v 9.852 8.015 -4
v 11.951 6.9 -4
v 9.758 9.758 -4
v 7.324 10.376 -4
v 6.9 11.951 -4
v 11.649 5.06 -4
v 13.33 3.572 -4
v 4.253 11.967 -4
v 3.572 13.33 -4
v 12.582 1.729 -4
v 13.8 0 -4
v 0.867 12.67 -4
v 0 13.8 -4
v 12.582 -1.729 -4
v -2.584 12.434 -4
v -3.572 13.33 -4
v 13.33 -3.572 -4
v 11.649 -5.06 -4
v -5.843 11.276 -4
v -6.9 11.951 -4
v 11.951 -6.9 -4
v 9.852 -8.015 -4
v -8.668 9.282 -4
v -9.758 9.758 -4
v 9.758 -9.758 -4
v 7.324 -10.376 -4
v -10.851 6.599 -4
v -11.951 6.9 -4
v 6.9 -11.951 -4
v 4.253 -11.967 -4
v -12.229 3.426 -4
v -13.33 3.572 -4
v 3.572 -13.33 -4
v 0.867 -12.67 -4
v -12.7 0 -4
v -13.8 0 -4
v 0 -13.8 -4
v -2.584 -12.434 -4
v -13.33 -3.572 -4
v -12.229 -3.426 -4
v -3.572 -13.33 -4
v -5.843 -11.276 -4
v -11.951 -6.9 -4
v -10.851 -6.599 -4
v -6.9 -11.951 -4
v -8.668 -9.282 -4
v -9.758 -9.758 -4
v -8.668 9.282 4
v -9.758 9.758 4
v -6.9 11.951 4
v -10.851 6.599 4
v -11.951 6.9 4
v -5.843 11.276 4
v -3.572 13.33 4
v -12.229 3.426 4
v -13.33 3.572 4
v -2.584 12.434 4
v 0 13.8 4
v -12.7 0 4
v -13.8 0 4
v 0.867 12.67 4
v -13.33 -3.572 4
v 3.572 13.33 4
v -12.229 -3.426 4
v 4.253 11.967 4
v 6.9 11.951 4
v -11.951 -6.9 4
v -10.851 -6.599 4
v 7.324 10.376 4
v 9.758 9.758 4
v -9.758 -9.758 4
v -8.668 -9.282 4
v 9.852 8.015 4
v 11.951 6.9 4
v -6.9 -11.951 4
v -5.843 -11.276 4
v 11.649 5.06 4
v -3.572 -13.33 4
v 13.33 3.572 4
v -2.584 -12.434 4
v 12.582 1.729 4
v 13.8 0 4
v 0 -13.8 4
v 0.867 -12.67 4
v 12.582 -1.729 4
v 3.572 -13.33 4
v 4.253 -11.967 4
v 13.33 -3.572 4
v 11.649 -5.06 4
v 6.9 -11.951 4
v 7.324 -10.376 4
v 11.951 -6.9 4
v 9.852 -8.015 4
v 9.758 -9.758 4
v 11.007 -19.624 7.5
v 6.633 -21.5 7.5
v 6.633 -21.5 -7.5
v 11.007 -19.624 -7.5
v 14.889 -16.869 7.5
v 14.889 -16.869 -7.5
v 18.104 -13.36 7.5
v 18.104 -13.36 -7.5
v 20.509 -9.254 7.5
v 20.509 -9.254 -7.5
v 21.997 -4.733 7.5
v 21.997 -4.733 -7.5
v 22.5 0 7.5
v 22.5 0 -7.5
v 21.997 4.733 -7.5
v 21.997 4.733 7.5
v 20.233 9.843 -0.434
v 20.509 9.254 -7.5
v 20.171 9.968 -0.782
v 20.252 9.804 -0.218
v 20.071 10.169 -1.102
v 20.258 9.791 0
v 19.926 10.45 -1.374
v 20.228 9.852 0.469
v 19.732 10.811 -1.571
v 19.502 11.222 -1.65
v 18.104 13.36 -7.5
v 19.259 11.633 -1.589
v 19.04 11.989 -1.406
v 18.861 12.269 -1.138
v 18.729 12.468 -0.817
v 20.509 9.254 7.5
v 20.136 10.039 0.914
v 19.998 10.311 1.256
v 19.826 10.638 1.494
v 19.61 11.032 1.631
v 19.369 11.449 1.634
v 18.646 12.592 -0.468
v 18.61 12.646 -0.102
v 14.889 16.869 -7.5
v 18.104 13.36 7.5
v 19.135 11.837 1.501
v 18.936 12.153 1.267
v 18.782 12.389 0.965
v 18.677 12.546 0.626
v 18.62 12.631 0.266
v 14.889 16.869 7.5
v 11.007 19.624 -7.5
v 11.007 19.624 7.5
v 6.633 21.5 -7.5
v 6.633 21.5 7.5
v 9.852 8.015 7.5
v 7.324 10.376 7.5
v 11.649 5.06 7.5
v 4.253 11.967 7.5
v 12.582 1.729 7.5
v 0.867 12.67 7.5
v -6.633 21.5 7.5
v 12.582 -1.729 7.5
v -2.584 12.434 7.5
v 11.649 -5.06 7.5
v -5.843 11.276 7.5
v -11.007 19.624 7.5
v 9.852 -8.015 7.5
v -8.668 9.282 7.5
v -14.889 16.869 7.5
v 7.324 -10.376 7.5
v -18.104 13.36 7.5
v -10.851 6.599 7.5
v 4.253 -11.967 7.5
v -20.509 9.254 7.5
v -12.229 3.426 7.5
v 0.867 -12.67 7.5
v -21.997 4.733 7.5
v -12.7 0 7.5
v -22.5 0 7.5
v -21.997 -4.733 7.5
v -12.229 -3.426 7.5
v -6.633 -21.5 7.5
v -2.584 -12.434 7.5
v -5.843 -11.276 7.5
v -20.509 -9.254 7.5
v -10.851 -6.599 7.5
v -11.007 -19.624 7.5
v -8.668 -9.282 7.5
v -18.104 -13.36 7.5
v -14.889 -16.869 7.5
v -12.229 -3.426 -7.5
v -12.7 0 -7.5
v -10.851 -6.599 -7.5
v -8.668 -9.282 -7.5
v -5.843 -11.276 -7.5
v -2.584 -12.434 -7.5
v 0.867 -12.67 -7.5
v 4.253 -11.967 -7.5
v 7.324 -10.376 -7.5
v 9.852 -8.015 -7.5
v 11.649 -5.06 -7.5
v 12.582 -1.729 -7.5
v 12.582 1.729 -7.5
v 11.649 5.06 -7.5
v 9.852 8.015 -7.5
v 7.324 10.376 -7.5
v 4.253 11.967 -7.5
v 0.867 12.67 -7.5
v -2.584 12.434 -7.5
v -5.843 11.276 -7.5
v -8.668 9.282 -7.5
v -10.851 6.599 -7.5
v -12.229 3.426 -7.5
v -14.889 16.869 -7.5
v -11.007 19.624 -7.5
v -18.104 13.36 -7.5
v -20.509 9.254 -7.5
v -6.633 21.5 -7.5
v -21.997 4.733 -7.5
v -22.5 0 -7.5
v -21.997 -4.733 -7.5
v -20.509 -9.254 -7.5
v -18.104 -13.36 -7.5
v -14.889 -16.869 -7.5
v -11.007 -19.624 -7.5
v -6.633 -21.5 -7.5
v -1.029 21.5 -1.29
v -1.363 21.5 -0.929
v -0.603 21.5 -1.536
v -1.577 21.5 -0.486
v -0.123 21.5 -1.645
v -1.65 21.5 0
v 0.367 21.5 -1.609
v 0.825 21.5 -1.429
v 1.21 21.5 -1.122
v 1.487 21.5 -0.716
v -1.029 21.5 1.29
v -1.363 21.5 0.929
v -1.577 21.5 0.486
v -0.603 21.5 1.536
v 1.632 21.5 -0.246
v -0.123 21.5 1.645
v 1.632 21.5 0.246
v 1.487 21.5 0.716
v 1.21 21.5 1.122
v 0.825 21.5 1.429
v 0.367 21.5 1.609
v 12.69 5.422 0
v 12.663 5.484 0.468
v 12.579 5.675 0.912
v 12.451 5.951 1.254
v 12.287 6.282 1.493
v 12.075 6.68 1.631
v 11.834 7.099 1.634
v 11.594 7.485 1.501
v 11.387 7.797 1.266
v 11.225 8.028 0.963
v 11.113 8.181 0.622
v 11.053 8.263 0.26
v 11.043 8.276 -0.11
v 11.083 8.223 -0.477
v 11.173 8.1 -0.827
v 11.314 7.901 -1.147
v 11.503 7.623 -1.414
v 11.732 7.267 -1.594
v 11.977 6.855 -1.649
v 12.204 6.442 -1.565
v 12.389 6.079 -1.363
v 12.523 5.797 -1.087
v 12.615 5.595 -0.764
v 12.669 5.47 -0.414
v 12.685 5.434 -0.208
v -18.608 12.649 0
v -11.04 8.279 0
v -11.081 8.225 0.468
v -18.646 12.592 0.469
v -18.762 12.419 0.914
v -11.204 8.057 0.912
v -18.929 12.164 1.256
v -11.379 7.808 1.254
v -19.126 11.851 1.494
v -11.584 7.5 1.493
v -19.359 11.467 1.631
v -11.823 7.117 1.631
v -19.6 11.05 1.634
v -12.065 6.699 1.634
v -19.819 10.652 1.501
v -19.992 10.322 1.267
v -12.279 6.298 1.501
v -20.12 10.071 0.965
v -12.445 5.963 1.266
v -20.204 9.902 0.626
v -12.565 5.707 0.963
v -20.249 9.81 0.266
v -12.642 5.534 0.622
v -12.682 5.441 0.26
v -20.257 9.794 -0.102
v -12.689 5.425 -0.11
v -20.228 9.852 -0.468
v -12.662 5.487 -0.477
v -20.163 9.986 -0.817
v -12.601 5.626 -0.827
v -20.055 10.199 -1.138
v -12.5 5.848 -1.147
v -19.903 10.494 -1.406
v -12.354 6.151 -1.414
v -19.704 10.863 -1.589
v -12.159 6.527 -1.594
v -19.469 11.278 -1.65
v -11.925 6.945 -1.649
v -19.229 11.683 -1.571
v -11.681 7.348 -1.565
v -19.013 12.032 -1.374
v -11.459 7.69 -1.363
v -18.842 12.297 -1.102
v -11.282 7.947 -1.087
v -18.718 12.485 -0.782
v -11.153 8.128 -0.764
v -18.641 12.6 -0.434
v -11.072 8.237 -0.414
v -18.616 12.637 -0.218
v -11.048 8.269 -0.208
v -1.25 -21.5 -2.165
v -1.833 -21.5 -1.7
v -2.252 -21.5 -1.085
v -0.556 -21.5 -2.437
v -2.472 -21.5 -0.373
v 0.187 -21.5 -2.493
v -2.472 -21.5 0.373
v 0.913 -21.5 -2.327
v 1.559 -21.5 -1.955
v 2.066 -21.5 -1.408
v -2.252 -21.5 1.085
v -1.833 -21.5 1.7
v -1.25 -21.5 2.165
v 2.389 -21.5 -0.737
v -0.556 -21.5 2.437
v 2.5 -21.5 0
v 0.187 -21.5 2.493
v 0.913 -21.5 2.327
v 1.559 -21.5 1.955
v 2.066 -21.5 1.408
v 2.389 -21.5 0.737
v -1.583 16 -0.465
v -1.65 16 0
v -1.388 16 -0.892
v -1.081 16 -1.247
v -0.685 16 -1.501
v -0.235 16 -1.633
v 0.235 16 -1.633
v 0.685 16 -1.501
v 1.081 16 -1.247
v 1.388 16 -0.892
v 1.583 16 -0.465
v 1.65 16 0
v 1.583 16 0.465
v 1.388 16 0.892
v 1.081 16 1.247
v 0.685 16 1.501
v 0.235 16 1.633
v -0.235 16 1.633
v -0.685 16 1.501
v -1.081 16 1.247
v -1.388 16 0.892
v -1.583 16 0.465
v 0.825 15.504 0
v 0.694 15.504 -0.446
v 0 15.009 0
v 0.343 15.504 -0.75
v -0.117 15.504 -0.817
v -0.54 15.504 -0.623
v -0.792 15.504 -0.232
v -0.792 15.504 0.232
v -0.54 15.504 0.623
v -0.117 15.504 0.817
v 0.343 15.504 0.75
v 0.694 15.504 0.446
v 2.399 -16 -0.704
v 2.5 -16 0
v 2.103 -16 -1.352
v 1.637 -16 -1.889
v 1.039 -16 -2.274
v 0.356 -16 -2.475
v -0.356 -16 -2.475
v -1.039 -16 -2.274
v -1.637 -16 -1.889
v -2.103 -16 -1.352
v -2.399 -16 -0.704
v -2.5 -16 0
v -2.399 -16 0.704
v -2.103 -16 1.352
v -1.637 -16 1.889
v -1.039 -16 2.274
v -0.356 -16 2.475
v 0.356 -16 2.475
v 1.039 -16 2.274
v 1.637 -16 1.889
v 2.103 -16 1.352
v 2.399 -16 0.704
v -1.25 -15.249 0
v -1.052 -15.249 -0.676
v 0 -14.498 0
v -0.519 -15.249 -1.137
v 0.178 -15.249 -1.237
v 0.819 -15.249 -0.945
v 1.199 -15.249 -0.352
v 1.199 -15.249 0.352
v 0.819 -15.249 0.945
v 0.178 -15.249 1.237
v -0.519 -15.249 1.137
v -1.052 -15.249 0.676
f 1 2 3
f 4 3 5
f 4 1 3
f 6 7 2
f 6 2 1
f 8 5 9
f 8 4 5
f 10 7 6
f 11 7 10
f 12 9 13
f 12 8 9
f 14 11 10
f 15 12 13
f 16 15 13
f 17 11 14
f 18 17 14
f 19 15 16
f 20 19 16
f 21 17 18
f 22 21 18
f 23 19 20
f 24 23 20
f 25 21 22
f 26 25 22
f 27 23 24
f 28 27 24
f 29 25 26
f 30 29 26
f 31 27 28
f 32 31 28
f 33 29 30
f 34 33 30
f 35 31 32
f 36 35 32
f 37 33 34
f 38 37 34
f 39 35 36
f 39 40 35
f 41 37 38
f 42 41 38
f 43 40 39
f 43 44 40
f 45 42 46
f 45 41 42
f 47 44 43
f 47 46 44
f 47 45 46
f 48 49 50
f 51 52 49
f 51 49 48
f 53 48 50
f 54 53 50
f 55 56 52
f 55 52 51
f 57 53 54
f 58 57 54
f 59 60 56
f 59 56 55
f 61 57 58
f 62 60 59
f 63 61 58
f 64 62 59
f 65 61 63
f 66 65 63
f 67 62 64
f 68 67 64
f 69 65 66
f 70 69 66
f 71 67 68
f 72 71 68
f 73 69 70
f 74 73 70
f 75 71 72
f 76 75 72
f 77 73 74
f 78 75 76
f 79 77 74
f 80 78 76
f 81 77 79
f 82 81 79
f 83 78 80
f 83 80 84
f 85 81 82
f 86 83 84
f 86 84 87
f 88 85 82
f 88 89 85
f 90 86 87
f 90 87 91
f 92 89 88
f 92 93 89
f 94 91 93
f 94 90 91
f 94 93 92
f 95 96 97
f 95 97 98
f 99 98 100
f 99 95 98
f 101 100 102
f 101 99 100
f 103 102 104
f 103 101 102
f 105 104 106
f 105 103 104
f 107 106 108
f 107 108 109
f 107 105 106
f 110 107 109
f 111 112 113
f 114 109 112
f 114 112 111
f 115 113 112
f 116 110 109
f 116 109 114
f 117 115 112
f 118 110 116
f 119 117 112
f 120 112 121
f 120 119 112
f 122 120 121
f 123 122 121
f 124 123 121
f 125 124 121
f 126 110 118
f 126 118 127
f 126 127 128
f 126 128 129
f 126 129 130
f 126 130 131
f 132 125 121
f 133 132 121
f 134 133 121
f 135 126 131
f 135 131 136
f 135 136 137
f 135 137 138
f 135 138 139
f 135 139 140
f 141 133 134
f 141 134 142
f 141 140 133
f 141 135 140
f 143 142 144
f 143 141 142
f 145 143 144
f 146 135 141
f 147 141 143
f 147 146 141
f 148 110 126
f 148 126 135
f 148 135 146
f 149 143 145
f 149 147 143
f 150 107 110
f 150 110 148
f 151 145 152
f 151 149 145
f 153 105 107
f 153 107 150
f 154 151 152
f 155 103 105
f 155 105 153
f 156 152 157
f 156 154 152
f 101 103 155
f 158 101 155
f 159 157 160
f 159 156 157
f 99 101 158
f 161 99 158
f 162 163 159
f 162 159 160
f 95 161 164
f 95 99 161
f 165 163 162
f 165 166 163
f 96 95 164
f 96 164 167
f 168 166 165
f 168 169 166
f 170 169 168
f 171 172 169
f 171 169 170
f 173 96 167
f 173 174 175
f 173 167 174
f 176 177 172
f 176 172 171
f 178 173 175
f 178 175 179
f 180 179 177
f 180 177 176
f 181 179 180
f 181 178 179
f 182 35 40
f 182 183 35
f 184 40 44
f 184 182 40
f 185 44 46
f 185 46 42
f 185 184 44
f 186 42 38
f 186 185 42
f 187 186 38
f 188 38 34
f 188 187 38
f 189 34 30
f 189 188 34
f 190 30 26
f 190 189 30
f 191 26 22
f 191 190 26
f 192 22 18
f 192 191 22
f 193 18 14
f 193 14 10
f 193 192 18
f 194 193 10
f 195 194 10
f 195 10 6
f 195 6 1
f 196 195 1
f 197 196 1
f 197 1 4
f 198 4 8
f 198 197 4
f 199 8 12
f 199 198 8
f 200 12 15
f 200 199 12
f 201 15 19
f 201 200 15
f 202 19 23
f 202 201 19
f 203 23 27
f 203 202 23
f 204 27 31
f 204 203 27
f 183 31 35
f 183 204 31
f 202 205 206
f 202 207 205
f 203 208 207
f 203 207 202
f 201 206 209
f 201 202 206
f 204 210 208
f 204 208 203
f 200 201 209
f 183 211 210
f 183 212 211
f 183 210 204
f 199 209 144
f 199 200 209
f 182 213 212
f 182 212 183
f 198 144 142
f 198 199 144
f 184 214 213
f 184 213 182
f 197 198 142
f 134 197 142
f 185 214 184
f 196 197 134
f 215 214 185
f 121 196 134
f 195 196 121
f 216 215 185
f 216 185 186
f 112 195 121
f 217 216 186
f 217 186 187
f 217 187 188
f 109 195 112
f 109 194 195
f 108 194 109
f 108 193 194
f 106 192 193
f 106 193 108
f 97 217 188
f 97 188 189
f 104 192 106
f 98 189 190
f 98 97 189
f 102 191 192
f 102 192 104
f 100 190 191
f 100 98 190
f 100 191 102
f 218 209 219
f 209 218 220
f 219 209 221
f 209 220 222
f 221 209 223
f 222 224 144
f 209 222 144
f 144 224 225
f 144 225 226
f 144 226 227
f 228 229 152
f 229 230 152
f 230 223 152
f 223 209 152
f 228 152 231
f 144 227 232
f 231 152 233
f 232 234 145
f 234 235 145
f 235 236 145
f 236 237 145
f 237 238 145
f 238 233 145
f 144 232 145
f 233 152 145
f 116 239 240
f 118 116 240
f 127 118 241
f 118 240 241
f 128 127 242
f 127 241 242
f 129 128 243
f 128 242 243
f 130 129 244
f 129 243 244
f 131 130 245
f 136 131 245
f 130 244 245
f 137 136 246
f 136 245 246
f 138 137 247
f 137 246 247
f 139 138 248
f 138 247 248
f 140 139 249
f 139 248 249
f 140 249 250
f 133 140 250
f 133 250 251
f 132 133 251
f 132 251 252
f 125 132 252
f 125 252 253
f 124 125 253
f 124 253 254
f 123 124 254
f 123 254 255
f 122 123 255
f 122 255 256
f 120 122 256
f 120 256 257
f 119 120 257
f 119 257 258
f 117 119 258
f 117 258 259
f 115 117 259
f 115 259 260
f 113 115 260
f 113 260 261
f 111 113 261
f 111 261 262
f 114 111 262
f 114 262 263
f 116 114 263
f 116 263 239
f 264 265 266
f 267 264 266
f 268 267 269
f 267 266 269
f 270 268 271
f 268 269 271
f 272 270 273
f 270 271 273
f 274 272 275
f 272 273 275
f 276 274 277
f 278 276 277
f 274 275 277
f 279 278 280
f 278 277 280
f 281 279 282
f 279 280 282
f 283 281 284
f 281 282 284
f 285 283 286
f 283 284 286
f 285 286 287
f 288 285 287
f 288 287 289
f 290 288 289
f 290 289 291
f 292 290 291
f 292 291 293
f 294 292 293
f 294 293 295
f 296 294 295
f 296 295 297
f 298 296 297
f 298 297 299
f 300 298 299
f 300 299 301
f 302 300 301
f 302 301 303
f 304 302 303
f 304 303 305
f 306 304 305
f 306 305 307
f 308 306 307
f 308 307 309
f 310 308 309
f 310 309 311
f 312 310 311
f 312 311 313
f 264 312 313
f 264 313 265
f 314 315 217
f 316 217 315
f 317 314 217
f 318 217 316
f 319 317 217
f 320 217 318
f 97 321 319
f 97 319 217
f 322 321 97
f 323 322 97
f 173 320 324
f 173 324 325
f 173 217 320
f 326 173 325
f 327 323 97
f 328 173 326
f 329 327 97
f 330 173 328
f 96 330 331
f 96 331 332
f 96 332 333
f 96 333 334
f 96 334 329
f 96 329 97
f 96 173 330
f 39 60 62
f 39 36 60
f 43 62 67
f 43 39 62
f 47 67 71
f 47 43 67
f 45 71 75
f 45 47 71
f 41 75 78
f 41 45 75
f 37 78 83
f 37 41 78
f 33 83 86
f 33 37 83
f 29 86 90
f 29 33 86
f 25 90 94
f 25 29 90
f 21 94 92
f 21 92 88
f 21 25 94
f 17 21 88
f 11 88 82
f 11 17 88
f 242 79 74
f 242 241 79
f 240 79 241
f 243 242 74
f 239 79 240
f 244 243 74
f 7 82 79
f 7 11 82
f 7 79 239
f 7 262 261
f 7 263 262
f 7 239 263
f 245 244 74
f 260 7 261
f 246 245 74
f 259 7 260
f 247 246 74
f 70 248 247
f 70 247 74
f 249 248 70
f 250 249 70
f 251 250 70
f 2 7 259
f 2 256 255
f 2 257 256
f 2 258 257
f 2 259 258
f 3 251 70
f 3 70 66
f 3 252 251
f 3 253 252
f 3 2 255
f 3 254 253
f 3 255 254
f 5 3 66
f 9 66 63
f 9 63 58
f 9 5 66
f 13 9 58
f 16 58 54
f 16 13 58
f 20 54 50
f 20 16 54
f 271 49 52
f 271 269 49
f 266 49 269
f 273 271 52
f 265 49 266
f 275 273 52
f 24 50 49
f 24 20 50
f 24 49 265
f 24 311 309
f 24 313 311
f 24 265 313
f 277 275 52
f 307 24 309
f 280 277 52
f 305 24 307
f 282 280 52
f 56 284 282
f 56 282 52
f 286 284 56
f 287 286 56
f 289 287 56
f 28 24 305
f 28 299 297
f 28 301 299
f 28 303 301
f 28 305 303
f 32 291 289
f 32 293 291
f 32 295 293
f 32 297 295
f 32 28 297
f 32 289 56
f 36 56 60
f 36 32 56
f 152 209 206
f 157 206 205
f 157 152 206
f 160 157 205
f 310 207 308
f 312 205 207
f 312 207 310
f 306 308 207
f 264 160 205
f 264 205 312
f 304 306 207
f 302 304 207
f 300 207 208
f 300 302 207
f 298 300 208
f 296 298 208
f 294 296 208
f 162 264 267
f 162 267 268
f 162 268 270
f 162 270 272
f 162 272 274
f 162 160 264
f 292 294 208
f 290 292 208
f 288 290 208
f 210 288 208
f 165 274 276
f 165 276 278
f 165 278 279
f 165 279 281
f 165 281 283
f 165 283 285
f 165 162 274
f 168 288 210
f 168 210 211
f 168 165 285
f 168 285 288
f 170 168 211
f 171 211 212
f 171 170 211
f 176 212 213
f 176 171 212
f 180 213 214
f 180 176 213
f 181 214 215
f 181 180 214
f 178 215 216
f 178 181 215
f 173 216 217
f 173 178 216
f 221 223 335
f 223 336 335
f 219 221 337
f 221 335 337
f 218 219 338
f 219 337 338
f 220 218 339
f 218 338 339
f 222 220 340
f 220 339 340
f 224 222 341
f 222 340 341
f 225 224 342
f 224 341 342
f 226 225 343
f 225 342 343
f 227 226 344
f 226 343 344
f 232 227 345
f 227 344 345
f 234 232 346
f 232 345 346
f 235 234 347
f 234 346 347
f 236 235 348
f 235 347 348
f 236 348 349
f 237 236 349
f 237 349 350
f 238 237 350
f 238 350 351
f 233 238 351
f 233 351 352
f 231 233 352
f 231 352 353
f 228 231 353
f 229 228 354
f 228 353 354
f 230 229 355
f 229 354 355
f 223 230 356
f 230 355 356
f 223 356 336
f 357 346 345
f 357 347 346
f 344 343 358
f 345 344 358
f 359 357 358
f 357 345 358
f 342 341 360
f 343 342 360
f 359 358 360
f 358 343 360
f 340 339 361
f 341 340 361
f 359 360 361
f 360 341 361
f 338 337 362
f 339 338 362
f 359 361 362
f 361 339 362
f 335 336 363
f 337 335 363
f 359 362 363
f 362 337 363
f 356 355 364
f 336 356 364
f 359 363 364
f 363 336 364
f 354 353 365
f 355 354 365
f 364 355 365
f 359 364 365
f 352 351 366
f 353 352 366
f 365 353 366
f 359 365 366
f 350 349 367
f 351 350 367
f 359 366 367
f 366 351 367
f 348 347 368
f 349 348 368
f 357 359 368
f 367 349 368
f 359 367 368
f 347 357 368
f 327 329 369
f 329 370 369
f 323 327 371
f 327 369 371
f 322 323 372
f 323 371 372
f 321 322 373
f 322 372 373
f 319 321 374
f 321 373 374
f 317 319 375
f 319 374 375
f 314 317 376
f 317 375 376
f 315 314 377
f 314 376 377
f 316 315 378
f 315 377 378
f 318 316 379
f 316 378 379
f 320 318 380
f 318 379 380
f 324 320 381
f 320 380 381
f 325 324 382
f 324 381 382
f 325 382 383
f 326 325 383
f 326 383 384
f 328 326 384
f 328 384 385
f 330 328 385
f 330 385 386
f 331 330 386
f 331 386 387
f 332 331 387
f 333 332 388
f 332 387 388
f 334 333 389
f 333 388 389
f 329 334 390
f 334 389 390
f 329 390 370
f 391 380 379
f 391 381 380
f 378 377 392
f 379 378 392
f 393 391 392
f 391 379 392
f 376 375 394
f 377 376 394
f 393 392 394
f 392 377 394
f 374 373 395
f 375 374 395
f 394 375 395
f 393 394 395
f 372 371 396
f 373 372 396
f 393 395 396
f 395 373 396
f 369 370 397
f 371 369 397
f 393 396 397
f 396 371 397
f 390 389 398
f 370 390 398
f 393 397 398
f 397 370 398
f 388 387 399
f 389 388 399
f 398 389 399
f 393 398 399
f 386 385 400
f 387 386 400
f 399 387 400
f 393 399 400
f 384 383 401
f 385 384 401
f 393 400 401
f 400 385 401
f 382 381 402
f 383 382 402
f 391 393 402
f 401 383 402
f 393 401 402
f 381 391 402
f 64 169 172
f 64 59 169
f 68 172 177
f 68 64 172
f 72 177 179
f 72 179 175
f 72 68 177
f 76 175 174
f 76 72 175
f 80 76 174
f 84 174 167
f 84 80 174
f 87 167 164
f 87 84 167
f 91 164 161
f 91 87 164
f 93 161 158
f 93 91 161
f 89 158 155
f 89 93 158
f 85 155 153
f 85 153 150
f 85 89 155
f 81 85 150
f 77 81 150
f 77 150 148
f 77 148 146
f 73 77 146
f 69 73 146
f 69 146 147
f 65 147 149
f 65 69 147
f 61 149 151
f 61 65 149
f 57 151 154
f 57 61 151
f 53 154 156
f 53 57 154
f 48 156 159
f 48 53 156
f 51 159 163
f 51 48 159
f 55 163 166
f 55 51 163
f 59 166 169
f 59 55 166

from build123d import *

# Parameters (mm, degrees)
SKETCH_2_W                       = 64.02174429
SKETCH_2_H                       = 9.248919907
CUT_EXTRUDE_1_DEPTH              = 49
HOLE_WIZARD_M4_2_D               = 3.3
HOLE_WIZARD_M4_2_DEPTH           = 5.5
HOLE_WIZARD_M4_2_TIP             = 0.991420021
HOLE_WIZARD_M6_2_D               = 5
HOLE_WIZARD_M6_2_DEPTH           = 5.5
HOLE_WIZARD_M6_2_TIP             = 1.502151548
HOLE_WIZARD_M4_3_D               = 3.3
HOLE_WIZARD_M4_3_DEPTH           = 13.4
HOLE_WIZARD_M4_3_TIP             = 0.991420021
HOLE_WIZARD_M4_3_ON_FACE_2_D     = 3.3
HOLE_WIZARD_M4_3_ON_FACE_2_DEPTH = 13.4
HOLE_WIZARD_M4_3_ON_FACE_2_TIP   = 0.991420021


with BuildPart() as part:
    # 草图1 → 旋转1 (revolve)
    with BuildSketch(Plane(origin=(0, 0, 0), x_dir=(1, 0, 0), z_dir=(0, 1, 0)), mode=Mode.PRIVATE) as revolve_1_sk:
        Polygon((22.5, 7.5), (22.5, -7.5), (12.7, -7.5), (12.7, -4), (13.8, -4), (13.8, 4), (12.7, 4), (12.7, 7.5), align=None)
    revolve(revolve_1_sk.sketch.rotate(Axis((0, 0, -31.9390681), (0, 0, 1)), 180), axis=Axis((0, 0, -31.9390681), (0, 0, 1)))  # turned: the seam where the file's is

    # 草图2 → 切除-拉伸1 (cut)
    with BuildSketch(Plane.XY.offset(7.5)):
        with Locations((-1.141100508, 26.124459954)):
            Rectangle(SKETCH_2_W, SKETCH_2_H)
        with Locations((-1.141100508, -26.124459954)):
            Rectangle(SKETCH_2_W, SKETCH_2_H)
    extrude(amount=-CUT_EXTRUDE_1_DEPTH, mode=Mode.SUBTRACT)

    # M4 螺纹孔2
    with Locations(Plane(origin=(0, 21.5, 0), x_dir=(1, 0, 0), z_dir=(0, 1, 0))):
        with Locations((0, 0)):
            Hole(HOLE_WIZARD_M4_2_D / 2, depth=HOLE_WIZARD_M4_2_DEPTH)
            with Locations((0, 0, -(HOLE_WIZARD_M4_2_DEPTH + HOLE_WIZARD_M4_2_TIP / 2))):  # 118° drill point
                Cone(0, HOLE_WIZARD_M4_2_D / 2, HOLE_WIZARD_M4_2_TIP, mode=Mode.SUBTRACT)

    # M6 螺纹孔2
    with Locations(Plane(origin=(0, -21.5, 0), x_dir=(-1, 0, 0), z_dir=(0, -1, 0))):
        with Locations((0, 0)):
            Hole(HOLE_WIZARD_M6_2_D / 2, depth=HOLE_WIZARD_M6_2_DEPTH)
            with Locations((0, 0, -(HOLE_WIZARD_M6_2_DEPTH + HOLE_WIZARD_M6_2_TIP / 2))):  # 118° drill point
                Cone(0, HOLE_WIZARD_M6_2_D / 2, HOLE_WIZARD_M6_2_TIP, mode=Mode.SUBTRACT)

    # M4 螺纹孔3
    with Locations(Plane(origin=(19.485571585, 11.25, 0), x_dir=(-0.5, 0.866025404, 0), z_dir=(0.866025404, 0.5, 0))):
        with Locations((0, 0)):
            Hole(HOLE_WIZARD_M4_3_D / 2, depth=HOLE_WIZARD_M4_3_DEPTH)
            with Locations((0, 0, -(HOLE_WIZARD_M4_3_DEPTH + HOLE_WIZARD_M4_3_TIP / 2))):  # 118° drill point
                Cone(0, HOLE_WIZARD_M4_3_D / 2, HOLE_WIZARD_M4_3_TIP, mode=Mode.SUBTRACT)

    # M4 螺纹孔3 on face 2
    with Locations(Plane(origin=(-19.485571585, 11.25, 0), x_dir=(-0.500000175, -0.866025303, 0), z_dir=(-0.866025303, 0.500000175, 0))):
        with Locations((0, 0)):
            Hole(HOLE_WIZARD_M4_3_ON_FACE_2_D / 2, depth=HOLE_WIZARD_M4_3_ON_FACE_2_DEPTH)
            with Locations((0, 0, -(HOLE_WIZARD_M4_3_ON_FACE_2_DEPTH + HOLE_WIZARD_M4_3_ON_FACE_2_TIP / 2))):  # 118° drill point
                Cone(0, HOLE_WIZARD_M4_3_ON_FACE_2_D / 2, HOLE_WIZARD_M4_3_ON_FACE_2_TIP, mode=Mode.SUBTRACT)


solid = part.part
